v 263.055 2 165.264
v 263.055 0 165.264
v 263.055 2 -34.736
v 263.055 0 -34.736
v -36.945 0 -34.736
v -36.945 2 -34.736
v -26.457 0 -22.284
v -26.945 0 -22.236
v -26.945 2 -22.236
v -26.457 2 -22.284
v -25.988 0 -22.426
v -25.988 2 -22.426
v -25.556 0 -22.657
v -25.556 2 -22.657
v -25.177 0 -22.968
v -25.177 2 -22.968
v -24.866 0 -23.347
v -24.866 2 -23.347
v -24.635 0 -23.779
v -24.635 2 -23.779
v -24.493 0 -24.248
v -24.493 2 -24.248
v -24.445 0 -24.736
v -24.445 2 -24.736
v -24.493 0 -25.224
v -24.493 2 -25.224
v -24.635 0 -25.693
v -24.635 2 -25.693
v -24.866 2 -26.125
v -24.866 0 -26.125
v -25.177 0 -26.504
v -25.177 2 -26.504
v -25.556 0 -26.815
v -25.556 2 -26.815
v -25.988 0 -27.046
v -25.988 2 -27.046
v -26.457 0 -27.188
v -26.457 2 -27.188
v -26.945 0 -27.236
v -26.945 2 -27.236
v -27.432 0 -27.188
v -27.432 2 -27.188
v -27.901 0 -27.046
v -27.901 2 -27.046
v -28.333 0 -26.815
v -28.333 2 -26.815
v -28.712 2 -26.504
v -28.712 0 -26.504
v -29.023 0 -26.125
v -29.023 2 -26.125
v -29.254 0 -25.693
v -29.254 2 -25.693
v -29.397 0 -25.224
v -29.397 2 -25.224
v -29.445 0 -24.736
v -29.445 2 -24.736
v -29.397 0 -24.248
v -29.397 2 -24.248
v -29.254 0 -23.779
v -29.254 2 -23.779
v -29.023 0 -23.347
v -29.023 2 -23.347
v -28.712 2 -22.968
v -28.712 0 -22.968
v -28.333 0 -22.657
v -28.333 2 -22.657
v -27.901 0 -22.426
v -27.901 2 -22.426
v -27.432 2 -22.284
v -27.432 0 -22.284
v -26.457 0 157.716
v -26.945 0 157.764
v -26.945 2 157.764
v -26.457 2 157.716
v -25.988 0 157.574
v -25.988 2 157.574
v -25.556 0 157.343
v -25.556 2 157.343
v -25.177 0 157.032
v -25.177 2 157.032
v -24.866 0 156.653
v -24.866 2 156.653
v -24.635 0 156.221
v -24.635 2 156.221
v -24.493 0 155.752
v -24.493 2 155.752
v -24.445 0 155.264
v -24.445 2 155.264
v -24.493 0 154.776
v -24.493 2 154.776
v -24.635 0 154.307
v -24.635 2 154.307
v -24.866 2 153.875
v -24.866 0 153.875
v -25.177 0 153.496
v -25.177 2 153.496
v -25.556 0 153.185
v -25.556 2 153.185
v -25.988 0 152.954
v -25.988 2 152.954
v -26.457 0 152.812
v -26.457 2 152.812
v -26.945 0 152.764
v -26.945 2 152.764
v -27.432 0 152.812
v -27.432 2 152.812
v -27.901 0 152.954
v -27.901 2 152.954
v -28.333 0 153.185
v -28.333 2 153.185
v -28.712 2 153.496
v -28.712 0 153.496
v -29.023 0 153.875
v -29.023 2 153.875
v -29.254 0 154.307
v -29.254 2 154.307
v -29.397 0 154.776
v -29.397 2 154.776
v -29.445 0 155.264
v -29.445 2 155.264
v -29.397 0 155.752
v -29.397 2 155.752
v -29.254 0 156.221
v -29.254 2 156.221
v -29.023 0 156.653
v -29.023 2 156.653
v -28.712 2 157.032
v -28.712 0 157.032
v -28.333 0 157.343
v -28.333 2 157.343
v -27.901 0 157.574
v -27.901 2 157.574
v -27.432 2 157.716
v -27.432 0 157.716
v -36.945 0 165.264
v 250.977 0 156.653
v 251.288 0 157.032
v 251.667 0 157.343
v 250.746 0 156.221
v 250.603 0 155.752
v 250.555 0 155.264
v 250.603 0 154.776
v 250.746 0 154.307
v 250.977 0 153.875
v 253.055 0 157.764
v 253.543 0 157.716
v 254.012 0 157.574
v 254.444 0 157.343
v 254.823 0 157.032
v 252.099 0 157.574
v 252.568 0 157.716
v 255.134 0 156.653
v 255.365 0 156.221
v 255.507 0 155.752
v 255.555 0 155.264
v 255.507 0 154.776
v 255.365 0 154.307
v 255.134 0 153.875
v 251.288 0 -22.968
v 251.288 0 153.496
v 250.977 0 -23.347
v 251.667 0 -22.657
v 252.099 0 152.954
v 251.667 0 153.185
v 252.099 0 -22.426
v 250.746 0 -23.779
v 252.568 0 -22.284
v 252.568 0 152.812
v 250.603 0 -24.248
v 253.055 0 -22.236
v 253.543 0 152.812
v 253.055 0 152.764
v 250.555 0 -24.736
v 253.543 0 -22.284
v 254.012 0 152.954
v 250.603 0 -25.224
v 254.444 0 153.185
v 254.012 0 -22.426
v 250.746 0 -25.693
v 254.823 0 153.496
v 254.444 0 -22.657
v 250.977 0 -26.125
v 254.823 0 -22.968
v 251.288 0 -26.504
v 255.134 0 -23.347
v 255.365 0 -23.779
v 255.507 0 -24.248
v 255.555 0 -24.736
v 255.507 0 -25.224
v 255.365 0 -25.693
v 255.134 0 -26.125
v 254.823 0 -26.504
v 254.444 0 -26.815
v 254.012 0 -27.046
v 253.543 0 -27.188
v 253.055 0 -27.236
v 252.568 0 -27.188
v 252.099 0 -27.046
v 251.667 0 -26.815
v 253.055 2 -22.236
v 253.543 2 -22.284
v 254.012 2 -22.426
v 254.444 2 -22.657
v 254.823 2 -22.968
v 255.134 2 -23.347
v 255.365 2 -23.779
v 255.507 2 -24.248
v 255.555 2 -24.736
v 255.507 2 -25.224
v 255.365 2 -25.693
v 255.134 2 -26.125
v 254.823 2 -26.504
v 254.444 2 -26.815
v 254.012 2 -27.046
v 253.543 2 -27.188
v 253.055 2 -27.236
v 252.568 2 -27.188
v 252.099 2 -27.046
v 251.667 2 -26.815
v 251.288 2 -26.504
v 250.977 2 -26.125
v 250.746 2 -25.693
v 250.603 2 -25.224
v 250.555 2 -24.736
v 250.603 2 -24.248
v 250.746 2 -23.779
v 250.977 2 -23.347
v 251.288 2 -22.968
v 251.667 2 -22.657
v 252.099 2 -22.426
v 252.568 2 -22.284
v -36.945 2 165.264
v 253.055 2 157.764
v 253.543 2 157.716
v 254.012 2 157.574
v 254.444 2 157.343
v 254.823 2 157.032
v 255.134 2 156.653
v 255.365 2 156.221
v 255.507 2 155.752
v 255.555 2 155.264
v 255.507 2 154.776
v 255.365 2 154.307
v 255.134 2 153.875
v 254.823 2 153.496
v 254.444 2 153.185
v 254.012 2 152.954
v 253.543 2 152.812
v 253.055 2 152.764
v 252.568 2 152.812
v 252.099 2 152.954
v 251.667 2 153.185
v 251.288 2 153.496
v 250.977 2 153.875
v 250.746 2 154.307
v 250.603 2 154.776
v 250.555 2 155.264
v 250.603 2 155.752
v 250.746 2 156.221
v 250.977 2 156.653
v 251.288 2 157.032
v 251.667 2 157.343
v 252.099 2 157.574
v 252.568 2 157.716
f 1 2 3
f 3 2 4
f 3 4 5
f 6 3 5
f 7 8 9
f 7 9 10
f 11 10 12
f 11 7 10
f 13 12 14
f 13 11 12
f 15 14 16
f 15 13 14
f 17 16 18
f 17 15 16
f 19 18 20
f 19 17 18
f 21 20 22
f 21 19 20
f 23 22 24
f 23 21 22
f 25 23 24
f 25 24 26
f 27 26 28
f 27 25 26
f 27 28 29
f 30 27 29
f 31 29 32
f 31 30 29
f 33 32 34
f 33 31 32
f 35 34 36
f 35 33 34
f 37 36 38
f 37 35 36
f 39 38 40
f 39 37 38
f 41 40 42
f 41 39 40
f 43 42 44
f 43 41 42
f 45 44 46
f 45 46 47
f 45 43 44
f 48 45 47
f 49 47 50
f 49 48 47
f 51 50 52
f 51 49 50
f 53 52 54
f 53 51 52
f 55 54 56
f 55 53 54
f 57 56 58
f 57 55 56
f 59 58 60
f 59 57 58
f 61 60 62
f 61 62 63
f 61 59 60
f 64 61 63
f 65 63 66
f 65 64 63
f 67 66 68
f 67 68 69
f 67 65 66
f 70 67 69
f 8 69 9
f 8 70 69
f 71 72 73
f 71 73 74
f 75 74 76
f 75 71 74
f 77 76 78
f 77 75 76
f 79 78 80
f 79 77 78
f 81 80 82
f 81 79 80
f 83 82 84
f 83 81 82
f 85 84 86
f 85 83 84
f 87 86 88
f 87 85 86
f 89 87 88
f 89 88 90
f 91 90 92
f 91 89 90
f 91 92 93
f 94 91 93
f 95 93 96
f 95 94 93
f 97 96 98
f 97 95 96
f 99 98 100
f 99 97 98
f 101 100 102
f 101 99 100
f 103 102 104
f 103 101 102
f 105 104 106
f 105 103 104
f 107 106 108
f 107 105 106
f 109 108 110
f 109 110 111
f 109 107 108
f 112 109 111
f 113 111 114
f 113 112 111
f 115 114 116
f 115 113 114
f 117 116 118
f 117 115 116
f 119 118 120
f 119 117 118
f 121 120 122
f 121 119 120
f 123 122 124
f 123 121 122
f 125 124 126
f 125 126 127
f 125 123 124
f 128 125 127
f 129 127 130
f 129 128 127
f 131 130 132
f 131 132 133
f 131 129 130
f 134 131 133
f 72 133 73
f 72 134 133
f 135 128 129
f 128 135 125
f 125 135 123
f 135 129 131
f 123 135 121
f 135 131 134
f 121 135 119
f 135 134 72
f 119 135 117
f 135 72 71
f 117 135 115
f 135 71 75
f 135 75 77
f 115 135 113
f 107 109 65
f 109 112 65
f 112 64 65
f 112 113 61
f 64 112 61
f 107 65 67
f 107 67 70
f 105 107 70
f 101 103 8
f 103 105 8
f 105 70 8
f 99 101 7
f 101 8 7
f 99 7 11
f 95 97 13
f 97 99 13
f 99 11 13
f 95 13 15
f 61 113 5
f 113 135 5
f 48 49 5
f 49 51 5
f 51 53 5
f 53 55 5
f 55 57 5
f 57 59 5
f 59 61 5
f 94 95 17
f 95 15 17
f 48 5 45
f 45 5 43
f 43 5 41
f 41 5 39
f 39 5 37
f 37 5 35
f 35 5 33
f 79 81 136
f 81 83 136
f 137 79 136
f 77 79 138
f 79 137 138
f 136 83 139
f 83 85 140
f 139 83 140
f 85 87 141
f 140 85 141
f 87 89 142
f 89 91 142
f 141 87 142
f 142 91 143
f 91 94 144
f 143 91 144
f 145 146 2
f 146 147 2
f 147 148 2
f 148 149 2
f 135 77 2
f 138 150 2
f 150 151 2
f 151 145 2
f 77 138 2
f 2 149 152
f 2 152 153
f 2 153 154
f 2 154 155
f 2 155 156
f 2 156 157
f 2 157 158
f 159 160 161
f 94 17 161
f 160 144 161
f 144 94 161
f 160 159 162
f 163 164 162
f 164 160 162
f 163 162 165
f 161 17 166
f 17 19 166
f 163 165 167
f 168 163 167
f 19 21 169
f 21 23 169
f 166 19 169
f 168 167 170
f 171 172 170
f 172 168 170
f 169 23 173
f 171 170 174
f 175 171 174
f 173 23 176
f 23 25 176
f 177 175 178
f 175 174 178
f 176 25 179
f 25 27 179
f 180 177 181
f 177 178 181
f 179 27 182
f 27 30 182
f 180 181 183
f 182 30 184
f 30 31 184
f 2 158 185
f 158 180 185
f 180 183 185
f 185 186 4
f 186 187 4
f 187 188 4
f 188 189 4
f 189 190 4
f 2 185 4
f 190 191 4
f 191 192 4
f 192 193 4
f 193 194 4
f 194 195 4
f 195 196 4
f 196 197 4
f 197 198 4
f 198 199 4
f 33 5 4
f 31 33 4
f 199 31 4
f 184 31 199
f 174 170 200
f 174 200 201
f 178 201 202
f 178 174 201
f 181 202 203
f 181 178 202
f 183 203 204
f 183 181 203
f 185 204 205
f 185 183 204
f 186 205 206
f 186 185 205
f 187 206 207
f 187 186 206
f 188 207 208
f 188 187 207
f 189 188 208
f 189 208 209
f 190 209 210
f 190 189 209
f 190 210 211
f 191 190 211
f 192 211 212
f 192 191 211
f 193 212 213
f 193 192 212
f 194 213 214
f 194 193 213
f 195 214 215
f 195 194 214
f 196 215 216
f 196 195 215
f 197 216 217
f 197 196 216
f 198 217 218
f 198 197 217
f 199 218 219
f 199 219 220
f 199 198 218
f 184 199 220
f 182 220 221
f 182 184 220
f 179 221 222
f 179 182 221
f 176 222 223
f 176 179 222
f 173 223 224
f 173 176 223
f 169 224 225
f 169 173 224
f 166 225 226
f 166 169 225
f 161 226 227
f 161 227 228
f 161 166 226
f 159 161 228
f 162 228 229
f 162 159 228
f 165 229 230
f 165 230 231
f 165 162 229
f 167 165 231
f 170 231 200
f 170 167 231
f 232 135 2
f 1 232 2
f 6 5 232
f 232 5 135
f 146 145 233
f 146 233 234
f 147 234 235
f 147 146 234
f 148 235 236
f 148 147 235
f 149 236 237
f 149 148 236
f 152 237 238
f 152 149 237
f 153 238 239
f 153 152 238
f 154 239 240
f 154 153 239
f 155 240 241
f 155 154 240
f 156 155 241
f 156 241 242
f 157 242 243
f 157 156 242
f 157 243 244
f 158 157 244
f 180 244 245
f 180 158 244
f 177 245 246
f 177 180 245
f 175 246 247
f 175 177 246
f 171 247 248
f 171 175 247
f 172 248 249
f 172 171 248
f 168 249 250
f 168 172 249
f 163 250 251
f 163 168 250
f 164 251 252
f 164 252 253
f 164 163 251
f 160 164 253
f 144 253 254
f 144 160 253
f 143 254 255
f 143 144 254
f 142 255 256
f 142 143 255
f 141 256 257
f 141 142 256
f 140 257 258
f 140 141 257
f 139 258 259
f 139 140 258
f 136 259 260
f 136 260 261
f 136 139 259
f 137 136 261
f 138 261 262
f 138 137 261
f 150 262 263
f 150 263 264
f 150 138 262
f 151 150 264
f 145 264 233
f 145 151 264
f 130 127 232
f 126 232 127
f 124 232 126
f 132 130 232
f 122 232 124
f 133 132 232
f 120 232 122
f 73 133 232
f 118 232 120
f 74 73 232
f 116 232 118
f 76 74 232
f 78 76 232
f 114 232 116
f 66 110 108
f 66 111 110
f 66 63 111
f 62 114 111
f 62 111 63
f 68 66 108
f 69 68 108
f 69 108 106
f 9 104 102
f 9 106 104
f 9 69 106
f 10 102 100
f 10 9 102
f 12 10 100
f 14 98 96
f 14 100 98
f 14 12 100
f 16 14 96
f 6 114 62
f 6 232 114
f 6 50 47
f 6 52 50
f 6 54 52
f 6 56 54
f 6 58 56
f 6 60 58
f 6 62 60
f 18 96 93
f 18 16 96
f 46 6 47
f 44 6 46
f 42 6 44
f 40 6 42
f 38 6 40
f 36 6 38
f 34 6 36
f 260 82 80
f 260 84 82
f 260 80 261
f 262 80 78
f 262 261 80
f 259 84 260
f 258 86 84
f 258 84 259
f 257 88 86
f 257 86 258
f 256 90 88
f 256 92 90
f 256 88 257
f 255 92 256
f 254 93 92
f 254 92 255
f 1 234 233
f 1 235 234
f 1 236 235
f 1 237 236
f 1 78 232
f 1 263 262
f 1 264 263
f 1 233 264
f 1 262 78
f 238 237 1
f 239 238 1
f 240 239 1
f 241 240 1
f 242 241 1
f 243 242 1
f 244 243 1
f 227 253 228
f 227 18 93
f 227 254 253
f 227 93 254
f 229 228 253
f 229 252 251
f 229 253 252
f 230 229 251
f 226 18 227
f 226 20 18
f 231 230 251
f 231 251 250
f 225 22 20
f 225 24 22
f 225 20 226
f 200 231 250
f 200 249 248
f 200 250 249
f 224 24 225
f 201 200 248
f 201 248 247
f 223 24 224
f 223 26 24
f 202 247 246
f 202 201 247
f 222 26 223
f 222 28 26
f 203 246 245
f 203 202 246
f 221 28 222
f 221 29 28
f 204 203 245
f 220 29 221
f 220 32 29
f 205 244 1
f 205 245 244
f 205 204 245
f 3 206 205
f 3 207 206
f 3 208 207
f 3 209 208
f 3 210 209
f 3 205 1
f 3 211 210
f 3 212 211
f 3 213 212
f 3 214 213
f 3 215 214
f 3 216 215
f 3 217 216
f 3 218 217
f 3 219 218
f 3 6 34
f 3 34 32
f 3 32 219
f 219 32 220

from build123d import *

# Parameters (mm, degrees)
ESBO_O1_R                = 2.5
RESSALTO_EXTRUS_O1_DEPTH = 2


with BuildPart() as part:
    # Esboço1 → Ressalto-extrusão1 (new body)
    with BuildSketch(Plane(origin=(0, 0, 0), x_dir=(1, 0, 0), z_dir=(0, 1, 0))):
        Polygon((-26.94457055, 34.735927746), (-36.94457055, 34.735927746), (-36.94457055, -165.264072254), (-26.94457055, -165.264072254), (253.05542945, -165.264072254), (263.05542945, -165.264072254), (263.05542945, 34.735927746), (253.05542945, 34.735927746), align=None)
        with Locations(Location((-26.94457055, -155.264072254, 0), (0, 0, 270))):
            Circle(ESBO_O1_R, mode=Mode.SUBTRACT)
        with Locations(Location((253.05542945, -155.264072254, 0), (0, 0, 270))):
            Circle(ESBO_O1_R, mode=Mode.SUBTRACT)
        with Locations(Location((-26.94457055, 24.735927746, 0), (0, 0, 270))):
            Circle(ESBO_O1_R, mode=Mode.SUBTRACT)
        with Locations(Location((253.05542945, 24.735927746, 0), (0, 0, 270))):
            Circle(ESBO_O1_R, mode=Mode.SUBTRACT)
    extrude(amount=RESSALTO_EXTRUS_O1_DEPTH)


solid = part.part
